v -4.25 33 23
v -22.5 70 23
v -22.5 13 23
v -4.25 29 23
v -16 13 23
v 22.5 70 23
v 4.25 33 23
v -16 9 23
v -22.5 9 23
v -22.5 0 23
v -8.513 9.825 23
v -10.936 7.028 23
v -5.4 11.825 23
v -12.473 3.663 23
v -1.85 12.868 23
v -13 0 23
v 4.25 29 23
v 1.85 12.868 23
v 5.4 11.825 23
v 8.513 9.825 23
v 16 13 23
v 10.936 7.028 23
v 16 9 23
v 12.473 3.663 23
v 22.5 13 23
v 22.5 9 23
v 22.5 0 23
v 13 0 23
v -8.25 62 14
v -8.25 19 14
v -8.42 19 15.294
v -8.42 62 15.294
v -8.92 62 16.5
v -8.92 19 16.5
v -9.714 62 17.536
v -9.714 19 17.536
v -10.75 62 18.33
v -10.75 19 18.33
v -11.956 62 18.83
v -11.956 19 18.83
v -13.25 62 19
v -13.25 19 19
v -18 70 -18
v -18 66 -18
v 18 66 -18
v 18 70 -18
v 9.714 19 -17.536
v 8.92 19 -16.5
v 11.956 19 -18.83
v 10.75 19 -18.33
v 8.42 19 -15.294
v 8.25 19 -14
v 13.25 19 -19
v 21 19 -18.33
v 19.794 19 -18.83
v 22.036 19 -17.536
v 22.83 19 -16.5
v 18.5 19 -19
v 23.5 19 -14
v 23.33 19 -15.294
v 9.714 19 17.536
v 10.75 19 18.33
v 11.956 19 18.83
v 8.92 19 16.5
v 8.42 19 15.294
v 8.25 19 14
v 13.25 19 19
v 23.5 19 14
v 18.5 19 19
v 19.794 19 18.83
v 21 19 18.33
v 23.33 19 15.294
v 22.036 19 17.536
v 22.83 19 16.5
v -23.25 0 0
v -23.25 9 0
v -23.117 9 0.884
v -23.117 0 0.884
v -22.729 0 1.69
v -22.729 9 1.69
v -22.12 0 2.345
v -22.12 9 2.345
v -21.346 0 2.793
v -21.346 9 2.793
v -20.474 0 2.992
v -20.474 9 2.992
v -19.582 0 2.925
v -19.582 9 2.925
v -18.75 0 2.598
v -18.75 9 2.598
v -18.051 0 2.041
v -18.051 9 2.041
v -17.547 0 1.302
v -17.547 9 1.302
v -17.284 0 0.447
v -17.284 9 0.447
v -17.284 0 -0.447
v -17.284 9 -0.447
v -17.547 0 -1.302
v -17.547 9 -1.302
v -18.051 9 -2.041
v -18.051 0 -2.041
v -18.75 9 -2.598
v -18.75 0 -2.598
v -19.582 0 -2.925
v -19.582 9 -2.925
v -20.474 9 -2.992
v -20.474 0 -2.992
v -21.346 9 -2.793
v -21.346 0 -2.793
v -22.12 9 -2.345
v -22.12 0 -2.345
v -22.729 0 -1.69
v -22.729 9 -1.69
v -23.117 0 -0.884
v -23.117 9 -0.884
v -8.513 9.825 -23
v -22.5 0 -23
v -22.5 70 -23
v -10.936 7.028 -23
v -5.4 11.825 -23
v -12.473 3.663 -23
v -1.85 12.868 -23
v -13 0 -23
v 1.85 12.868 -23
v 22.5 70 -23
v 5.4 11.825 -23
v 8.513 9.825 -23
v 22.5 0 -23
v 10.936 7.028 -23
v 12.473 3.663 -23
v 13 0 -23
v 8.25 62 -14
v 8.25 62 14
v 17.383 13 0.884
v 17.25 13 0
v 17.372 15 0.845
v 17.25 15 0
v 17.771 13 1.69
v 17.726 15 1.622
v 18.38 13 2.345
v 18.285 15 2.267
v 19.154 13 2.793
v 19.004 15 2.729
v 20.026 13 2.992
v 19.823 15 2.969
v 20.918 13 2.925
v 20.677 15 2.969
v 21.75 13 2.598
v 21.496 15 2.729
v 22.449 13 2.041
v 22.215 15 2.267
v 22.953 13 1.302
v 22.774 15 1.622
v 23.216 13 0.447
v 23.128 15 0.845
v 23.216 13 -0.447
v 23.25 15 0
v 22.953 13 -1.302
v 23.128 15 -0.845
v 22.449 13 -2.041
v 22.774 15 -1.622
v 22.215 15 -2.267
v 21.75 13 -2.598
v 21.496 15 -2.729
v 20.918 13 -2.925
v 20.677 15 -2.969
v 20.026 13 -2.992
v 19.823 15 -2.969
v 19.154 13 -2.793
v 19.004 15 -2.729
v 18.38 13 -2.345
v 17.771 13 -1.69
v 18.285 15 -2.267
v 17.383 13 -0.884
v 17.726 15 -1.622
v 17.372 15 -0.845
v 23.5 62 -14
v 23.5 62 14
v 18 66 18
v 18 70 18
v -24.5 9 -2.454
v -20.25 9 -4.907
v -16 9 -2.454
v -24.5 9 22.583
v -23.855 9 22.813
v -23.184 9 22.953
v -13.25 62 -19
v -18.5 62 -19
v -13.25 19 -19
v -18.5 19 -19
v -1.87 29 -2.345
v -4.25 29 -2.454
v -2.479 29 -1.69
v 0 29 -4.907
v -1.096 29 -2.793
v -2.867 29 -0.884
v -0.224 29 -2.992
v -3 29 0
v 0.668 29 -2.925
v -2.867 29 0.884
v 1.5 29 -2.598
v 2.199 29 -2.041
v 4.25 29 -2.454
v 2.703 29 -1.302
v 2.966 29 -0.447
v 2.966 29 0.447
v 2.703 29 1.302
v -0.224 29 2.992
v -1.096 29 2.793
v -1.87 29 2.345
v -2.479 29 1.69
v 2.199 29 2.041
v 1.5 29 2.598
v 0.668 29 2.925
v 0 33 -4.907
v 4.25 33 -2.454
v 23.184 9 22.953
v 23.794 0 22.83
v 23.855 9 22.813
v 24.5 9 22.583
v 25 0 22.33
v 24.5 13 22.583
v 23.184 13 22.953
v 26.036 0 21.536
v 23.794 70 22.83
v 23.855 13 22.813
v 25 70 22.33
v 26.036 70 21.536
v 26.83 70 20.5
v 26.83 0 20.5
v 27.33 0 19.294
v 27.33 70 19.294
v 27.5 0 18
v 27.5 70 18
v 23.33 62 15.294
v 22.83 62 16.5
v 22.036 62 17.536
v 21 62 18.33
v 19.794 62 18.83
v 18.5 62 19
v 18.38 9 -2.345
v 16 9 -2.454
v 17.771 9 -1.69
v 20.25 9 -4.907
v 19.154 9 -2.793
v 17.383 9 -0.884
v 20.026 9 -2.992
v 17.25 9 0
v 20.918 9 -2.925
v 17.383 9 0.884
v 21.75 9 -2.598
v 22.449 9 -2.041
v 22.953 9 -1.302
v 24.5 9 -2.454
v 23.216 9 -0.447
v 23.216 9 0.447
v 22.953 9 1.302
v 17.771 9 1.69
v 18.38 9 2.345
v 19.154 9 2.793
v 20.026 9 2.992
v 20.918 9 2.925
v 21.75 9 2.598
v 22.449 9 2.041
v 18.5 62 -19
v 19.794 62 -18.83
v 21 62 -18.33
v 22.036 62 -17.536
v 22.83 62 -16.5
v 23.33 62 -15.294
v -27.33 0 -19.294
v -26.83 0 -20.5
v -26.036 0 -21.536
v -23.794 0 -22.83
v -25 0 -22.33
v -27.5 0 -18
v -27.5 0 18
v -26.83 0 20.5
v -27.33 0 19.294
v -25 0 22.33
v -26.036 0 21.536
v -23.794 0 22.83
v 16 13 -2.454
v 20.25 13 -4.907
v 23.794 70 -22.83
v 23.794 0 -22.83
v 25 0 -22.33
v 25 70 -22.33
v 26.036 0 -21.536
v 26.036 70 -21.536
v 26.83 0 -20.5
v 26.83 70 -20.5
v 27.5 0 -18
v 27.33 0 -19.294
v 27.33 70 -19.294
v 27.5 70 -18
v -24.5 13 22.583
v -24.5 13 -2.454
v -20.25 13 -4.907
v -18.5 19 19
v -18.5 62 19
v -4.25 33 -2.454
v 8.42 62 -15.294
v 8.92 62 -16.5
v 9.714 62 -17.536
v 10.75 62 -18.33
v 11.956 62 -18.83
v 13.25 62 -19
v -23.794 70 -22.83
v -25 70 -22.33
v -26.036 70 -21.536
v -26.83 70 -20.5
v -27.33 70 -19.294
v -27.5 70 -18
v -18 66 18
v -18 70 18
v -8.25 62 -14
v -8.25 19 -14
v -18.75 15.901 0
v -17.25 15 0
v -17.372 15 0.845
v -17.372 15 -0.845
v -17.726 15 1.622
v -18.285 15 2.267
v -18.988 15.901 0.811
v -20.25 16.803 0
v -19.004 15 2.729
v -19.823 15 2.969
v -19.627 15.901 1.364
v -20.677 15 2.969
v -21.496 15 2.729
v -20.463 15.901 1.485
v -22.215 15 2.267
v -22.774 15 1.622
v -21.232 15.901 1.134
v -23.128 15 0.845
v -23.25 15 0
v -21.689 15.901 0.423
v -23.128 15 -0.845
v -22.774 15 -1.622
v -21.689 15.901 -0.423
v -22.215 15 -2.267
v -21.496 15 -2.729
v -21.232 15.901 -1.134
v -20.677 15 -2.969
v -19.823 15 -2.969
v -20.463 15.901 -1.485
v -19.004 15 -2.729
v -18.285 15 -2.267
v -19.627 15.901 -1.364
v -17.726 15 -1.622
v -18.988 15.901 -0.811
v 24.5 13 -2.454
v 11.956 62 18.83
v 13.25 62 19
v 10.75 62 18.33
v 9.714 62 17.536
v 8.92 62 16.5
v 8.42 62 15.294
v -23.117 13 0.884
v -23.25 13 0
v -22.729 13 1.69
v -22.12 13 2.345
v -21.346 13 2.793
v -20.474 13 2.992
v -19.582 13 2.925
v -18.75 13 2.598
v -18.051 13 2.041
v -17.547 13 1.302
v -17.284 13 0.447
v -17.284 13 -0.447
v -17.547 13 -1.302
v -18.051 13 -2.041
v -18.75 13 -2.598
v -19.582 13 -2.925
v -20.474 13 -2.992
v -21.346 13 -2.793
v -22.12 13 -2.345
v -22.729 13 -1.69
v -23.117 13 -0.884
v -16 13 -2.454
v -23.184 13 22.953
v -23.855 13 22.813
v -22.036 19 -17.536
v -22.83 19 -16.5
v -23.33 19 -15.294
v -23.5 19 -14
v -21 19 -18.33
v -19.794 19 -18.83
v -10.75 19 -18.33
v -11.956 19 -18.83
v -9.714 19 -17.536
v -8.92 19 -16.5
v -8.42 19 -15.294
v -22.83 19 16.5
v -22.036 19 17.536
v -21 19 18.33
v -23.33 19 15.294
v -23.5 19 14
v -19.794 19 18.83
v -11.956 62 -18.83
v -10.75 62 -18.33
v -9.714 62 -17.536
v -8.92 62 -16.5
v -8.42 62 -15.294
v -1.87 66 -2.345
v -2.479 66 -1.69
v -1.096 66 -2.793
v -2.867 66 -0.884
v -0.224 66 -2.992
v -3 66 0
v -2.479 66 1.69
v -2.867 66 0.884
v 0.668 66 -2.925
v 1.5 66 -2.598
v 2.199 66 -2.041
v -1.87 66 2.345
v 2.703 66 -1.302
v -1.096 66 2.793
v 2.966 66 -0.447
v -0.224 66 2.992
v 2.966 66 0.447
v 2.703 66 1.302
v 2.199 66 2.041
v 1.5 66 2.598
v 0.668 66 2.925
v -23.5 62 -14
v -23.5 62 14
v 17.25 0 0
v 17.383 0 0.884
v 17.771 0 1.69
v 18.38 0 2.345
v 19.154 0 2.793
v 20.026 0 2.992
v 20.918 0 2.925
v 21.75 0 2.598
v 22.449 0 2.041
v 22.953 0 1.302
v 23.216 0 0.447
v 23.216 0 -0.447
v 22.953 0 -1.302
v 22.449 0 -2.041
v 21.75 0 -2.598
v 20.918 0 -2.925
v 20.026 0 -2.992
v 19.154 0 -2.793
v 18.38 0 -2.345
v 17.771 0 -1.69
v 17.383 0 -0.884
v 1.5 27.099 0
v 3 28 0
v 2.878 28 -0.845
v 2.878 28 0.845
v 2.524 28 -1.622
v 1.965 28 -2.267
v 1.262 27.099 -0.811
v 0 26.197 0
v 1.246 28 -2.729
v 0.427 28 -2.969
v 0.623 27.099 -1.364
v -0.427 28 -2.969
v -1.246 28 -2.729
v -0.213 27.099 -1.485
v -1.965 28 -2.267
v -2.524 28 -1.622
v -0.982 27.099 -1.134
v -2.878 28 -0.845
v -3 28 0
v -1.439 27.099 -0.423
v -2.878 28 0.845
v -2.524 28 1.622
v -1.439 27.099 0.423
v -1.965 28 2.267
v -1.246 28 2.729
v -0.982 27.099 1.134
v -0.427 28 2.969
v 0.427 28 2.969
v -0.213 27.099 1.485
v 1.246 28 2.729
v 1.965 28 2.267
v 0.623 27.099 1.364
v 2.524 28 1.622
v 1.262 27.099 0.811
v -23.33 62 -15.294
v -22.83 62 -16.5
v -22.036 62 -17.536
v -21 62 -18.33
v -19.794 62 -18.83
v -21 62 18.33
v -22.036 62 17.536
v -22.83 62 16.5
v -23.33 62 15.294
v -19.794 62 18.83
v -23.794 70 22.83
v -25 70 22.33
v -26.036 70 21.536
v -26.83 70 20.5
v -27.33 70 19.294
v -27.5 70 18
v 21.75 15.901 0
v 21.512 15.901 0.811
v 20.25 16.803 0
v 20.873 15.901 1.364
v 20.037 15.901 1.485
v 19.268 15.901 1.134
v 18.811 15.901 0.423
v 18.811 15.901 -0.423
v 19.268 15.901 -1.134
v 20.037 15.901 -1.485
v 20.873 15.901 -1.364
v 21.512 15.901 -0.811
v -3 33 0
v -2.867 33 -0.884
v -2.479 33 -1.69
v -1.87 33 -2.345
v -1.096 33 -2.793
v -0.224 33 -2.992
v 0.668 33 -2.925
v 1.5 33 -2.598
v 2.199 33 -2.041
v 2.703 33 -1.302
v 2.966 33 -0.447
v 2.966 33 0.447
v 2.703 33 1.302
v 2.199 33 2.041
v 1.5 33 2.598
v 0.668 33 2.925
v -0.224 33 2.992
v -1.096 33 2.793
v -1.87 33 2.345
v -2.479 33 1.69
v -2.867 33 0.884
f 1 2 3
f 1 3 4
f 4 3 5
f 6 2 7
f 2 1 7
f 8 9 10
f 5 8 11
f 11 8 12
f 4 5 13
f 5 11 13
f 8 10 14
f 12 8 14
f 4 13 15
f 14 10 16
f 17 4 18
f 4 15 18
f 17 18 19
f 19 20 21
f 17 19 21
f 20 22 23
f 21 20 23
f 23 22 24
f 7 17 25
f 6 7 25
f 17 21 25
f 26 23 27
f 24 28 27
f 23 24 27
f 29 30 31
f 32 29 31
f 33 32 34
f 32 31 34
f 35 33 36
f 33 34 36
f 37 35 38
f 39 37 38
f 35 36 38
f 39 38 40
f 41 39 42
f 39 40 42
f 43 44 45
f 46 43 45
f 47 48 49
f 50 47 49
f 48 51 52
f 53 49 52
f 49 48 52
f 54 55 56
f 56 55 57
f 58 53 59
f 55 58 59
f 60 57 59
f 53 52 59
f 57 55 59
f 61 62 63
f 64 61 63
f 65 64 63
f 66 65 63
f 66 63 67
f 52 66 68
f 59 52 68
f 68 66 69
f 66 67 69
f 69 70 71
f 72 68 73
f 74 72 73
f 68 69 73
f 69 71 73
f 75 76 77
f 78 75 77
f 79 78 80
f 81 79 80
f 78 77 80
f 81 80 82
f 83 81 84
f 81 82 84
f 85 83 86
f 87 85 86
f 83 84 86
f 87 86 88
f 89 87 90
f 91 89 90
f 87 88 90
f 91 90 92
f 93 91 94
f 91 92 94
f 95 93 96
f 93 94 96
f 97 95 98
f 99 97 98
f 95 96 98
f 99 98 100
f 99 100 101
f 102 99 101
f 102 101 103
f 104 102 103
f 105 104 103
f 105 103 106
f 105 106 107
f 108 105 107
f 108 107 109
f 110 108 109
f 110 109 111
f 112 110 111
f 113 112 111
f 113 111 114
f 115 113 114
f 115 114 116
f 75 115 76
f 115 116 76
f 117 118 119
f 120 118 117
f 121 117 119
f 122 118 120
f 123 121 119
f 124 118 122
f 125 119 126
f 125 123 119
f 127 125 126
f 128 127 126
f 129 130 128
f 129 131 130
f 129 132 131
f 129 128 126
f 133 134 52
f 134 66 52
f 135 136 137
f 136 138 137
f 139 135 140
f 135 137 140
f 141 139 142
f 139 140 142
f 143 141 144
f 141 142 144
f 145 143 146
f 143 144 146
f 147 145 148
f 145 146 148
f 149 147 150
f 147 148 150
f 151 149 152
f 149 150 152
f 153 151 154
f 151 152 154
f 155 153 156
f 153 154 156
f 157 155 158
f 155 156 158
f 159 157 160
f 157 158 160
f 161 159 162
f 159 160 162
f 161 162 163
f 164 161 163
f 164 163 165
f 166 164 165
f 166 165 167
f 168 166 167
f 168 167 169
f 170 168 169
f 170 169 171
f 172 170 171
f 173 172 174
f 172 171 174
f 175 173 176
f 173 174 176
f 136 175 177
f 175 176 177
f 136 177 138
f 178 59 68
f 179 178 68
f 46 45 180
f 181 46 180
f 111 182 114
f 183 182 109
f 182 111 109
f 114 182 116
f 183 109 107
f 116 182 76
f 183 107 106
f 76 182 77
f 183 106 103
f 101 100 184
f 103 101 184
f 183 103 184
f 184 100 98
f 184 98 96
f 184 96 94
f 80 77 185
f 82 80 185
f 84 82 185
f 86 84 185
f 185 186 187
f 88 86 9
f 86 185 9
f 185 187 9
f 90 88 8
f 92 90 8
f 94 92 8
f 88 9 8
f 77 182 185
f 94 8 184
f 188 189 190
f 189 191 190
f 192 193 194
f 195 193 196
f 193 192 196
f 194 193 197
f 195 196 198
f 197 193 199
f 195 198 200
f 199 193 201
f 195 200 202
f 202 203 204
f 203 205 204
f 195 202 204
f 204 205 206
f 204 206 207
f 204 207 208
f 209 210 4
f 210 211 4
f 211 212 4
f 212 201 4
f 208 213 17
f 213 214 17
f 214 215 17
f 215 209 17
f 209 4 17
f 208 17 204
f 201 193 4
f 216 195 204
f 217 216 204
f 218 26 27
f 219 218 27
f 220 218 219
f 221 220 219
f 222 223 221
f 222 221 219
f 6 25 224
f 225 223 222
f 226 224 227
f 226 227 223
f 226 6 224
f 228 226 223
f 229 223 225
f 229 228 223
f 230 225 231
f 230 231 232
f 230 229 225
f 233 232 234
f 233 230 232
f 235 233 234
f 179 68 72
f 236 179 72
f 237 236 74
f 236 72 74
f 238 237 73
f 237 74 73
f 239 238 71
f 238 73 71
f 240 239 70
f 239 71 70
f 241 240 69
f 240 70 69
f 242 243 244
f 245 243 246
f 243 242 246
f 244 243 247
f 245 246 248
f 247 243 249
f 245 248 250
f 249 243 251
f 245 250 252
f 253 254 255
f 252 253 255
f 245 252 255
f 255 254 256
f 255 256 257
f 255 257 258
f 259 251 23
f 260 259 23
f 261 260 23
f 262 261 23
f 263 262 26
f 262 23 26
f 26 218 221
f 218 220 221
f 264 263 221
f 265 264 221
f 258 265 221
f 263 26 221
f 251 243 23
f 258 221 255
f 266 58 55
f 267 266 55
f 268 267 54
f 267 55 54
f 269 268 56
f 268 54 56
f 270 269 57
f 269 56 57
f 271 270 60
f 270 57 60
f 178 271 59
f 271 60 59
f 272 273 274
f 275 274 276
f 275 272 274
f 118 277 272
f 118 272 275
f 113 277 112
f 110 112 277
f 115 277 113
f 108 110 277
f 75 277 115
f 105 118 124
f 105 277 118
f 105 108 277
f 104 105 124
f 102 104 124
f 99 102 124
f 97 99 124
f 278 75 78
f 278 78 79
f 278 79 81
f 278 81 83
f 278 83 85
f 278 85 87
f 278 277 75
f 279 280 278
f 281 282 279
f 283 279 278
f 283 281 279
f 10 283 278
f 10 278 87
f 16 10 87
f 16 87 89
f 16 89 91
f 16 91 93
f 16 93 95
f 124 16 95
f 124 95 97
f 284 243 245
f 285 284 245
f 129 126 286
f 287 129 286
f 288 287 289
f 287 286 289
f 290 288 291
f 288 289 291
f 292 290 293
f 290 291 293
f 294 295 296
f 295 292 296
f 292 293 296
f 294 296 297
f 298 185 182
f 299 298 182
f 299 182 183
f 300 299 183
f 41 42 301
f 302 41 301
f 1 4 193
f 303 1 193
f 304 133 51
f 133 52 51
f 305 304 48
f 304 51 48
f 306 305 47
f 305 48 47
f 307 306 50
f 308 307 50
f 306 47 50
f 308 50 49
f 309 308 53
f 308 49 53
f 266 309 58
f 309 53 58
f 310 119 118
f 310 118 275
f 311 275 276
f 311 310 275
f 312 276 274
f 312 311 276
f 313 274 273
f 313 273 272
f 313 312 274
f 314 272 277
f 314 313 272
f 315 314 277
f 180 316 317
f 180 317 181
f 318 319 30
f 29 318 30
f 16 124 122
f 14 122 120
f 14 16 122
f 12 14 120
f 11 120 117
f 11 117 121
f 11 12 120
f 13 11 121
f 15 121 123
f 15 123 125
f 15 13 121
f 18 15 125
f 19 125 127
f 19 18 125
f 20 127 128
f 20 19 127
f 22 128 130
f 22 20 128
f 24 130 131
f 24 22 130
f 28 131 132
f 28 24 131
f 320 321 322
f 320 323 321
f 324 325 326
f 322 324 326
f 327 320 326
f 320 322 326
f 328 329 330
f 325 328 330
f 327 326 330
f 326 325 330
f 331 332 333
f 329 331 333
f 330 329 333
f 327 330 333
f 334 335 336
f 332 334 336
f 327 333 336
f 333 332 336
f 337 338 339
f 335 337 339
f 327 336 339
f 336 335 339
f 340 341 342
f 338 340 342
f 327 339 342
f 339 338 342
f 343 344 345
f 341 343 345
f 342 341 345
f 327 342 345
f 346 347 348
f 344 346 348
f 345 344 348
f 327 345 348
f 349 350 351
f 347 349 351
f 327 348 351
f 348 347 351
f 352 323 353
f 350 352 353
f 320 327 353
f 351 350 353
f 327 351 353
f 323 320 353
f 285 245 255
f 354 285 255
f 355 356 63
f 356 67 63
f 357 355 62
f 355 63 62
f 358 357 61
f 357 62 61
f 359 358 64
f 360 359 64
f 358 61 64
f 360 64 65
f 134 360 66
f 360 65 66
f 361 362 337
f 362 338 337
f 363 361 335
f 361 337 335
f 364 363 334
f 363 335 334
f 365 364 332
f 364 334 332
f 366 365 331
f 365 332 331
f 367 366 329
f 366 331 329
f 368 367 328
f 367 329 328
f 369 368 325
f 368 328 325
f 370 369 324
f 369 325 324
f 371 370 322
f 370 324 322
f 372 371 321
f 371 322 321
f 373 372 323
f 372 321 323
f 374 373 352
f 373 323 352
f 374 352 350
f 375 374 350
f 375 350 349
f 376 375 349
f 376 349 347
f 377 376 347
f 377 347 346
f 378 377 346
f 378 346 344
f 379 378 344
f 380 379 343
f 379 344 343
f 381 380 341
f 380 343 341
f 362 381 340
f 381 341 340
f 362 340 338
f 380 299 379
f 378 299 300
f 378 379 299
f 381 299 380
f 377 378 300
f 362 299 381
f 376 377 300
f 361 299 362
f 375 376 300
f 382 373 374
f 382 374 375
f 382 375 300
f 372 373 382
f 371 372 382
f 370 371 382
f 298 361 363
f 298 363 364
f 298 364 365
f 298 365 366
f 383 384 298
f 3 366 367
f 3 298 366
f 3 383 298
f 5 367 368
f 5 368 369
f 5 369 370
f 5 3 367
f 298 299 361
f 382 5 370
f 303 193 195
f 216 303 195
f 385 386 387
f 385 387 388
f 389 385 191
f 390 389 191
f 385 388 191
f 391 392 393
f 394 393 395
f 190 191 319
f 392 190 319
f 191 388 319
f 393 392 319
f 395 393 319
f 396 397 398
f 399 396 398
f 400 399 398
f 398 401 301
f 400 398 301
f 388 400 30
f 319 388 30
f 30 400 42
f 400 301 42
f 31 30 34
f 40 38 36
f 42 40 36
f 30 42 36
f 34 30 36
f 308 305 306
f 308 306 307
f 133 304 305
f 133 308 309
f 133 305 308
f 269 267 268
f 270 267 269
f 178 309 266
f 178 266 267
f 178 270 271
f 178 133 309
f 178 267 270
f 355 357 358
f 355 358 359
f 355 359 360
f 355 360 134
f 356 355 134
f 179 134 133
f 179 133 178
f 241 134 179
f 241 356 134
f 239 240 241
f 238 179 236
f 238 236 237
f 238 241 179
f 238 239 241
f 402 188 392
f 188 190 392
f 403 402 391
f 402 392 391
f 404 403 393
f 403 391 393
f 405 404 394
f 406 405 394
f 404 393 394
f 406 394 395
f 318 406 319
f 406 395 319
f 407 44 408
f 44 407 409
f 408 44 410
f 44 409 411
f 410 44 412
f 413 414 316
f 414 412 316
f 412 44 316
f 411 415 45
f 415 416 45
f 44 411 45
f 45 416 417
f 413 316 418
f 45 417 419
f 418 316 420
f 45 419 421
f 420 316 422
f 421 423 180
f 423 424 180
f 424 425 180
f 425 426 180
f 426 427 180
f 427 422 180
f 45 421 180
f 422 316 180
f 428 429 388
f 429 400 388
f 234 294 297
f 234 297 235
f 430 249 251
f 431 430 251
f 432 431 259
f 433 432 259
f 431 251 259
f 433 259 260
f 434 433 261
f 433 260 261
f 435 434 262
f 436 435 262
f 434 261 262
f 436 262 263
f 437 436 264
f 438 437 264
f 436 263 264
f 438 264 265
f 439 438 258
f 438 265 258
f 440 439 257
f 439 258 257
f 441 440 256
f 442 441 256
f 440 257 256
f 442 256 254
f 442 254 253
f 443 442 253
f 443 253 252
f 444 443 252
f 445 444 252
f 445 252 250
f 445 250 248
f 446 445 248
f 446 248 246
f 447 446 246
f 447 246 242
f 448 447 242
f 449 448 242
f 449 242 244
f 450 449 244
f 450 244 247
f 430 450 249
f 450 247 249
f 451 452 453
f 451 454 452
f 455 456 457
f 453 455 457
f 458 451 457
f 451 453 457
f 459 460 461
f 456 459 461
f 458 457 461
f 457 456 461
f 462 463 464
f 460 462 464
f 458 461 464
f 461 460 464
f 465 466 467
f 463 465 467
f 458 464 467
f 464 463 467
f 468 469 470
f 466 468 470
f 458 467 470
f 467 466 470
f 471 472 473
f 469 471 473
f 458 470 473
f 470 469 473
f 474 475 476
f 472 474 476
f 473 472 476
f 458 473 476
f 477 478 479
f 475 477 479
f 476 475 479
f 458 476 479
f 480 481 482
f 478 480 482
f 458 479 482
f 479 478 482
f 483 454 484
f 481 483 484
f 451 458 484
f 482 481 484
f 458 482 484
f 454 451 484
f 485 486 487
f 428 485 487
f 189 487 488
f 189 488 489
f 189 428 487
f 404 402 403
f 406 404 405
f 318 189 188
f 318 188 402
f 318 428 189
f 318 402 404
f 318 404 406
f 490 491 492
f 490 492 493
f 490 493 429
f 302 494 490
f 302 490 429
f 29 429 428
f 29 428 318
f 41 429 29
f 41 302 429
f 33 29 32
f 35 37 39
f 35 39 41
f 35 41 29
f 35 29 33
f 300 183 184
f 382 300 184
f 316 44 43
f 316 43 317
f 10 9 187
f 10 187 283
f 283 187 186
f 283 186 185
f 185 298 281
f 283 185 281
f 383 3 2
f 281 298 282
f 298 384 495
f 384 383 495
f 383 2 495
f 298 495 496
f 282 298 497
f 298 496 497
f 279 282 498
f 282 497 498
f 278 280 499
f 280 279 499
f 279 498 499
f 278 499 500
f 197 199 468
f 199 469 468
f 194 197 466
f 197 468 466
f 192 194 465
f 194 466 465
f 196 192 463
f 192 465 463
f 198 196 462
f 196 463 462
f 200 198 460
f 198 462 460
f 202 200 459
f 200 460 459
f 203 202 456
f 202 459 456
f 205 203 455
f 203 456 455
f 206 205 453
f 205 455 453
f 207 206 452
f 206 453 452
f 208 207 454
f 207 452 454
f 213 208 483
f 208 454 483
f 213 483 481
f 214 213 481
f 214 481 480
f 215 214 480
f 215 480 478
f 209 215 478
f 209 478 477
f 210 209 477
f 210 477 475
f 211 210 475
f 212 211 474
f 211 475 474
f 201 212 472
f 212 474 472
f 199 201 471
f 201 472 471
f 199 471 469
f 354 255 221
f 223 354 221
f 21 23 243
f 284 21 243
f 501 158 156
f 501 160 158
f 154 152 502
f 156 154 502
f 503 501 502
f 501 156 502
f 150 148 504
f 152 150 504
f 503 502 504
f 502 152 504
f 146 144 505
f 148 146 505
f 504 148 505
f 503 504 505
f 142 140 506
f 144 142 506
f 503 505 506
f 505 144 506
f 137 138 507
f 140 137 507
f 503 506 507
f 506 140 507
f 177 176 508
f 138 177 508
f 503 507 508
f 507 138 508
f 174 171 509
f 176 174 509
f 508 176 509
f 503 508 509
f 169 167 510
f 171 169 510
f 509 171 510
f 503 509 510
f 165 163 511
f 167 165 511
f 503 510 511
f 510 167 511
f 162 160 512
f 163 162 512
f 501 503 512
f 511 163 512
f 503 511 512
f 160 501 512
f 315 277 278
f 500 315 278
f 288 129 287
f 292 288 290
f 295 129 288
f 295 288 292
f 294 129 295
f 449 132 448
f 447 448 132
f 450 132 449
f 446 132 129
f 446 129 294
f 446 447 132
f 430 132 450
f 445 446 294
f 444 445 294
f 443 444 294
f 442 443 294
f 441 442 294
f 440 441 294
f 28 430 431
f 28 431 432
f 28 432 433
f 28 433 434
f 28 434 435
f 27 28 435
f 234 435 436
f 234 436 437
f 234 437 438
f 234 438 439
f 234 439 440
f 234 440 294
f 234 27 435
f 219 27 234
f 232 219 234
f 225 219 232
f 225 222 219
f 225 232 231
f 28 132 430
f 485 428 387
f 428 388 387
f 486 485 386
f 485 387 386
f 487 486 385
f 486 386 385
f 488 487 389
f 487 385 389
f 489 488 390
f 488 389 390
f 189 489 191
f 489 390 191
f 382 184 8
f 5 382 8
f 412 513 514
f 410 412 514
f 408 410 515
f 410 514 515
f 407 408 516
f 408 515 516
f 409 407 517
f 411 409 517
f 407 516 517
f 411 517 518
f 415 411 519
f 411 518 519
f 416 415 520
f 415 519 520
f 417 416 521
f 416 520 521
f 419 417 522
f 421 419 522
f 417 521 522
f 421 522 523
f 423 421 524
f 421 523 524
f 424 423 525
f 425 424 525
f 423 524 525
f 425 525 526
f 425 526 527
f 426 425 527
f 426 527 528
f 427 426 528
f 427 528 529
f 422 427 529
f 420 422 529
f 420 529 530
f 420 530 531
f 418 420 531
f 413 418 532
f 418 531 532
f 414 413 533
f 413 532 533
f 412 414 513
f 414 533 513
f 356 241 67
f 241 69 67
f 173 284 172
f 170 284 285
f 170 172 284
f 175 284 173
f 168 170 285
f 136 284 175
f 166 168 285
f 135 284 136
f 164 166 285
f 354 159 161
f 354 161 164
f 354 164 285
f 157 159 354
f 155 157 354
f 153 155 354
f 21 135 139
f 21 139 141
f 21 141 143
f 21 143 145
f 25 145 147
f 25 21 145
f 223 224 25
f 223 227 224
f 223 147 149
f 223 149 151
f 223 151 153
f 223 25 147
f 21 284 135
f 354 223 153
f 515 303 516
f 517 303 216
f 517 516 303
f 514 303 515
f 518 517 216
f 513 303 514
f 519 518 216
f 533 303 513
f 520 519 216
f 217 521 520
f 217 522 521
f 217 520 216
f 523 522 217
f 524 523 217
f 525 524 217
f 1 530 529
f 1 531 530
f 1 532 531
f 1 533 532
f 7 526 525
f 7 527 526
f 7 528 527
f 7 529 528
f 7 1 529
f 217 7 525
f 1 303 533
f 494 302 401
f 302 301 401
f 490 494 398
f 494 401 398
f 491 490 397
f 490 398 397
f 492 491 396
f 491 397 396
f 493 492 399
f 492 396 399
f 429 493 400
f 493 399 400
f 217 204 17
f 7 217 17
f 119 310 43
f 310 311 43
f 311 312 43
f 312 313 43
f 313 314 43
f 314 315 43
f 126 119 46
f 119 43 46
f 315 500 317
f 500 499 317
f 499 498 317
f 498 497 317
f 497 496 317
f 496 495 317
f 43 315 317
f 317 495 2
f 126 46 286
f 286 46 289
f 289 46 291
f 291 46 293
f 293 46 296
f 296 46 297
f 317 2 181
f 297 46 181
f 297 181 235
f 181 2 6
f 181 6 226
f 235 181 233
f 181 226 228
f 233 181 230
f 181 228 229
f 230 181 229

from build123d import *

# Parameters (mm, degrees)
F0_W         = 55
F0_H         = 46
F5_DEPTH     = 70
F1_W         = 7.25
F1_H         = 70
F6_DEPTH     = 23
F7_D         = 6
F7_DEPTH     = 15
F7_TIP       = 1.8025818571
F9_DEPTH     = 4
F10_W        = 36
F10_H        = 36
F11_DEPTH    = 4
F12_D        = 6
F12_DEPTH    = 38
F12_TIP      = 1.8025818571
F14_DEPTH    = 4
F15_T1_DEPTH = 95
F16_DEPTH    = 33
F17_DEPTH    = 10


# Not quite as in the source:
# - a fillet or chamfer that OpenCascade refuses, or shapes differently, is made with other operations: its cross-section is extruded or revolved along the edge and cut away or added


with BuildPart() as f5:
    # F0 (on Front) → F5 (new body)
    with BuildSketch(Plane.XZ):
        Rectangle(F0_W, F0_H)
    extrude(amount=-F5_DEPTH)

    # F1 (on Top) → F6 (intersect, symmetric)
    with BuildSketch(Plane.XY):
        with BuildLine():
            Line((-20.25, 0), (-13, 0))
            ThreePointArc((-13, 0), (0, 13), (13, 0))
            Line((13, 0), (20.25, 0))
            Line((20.25, 0), (20.25, 70))
            Line((20.25, 70), (-20.25, 70))
            Line((-20.25, 70), (-20.25, 0))
        make_face()
        with Locations((-23.875, 35)):
            Rectangle(F1_W, F1_H)
        with Locations((23.875, 35)):
            Rectangle(F1_W, F1_H)
    extrude(amount=F6_DEPTH, both=True, mode=Mode.INTERSECT)

    # F7
    with Locations(Plane.XZ):
        with Locations((-20.25, 0), (20.25, 0)):
            Hole(F7_D / 2, depth=F7_DEPTH)
            with Locations((0, 0, -(F7_DEPTH + F7_TIP / 2))):  # 118° drill point
                Cone(0, F7_D / 2, F7_TIP, mode=Mode.SUBTRACT)

    # F8 (on offset) → F9 (cut)
    with BuildSketch(Plane.XZ.offset(-9)):
        Polygon((-24.5, 2.4537386441), (-24.5, 2.25), (-24.5, -2.4537386441), (-20.25, -4.9074772881), (-16, -2.4537386441), (-16, 2), (-16, 2.4537386441), (-20.25, 4.9074772881), align=None)
        Polygon((-24.5, 23), (-24.5, 2.4537386441), (-20.25, 4.9074772881), (-16, 2.4537386441), (-16, 23), align=None)
        Polygon((24.5, 2.4537386441), (24.5, 23), (16, 23), (16, 2.4537386441), (16, 2), (16, -2.4537386441), (20.25, -4.9074772881), (24.5, -2.4537386441), (24.5, 2.25), align=None)
    extrude(amount=-F9_DEPTH, mode=Mode.SUBTRACT)

    # F10 (on offset) → F11 (cut)
    with BuildSketch(Plane.XZ.offset(-66)):
        Rectangle(F10_W, F10_H)
    extrude(amount=-F11_DEPTH, mode=Mode.SUBTRACT)

    # F12
    with Locations(Plane(origin=(0, 66, 0), x_dir=(1, 0, 0), z_dir=(0, 1, 0))):
        with Locations((0, 0)):
            Hole(F12_D / 2, depth=F12_DEPTH)
            with Locations((0, 0, -(F12_DEPTH + F12_TIP / 2))):  # 118° drill point
                Cone(0, F12_D / 2, F12_TIP, mode=Mode.SUBTRACT)

    # F13 (on offset) → F14 (cut)
    with BuildSketch(Plane.XZ.offset(-29)):
        Polygon((-4.25, 2.4537386441), (-4.25, 2.25), (-4.25, -2.4537386441), (0, -4.9074772881), (4.25, -2.4537386441), (4.25, 2.0686155439), (4.25, 2.4537386441), (0, 4.9074772881), align=None)
        Polygon((-4.25, 23), (-4.25, 2.4537386441), (0, 4.9074772881), (4.25, 2.4537386441), (4.25, 23), align=None)
        with BuildLine():
            ThreePointArc((23.5, 14), (22.0355339059, 17.5355339059), (18.5, 19))
            Line((18.5, 19), (13.25, 19))
            ThreePointArc((13.25, 19), (9.7144660941, 17.5355339059), (8.25, 14))
            Line((8.25, 14), (8.25, -14))
            ThreePointArc((8.25, -14), (9.7144660941, -17.5355339059), (13.25, -19))
            Line((13.25, -19), (18.5, -19))
            ThreePointArc((18.5, -19), (22.0355339059, -17.5355339059), (23.5, -14))
            Line((23.5, -14), (23.5, 14))
        make_face()
        with BuildLine():
            Line((-13.25, 19), (-18.5, 19))
            ThreePointArc((-18.5, 19), (-22.0355339059, 17.5355339059), (-23.5, 14))
            Line((-23.5, 14), (-23.5, -14))
            ThreePointArc((-23.5, -14), (-22.0355339059, -17.5355339059), (-18.5, -19))
            Line((-18.5, -19), (-13.25, -19))
            ThreePointArc((-13.25, -19), (-9.7144660941, -17.5355339059), (-8.25, -14))
            Line((-8.25, -14), (-8.25, 14))
            ThreePointArc((-8.25, 14), (-9.7144660941, 17.5355339059), (-13.25, 19))
        make_face()
    extrude(amount=-F14_DEPTH, mode=Mode.SUBTRACT)

    # F15: fillet of radius 5 on 4 edges, made by hand

    # F15_s2 → F15_t1 (cut)
    with BuildSketch(Plane.XZ.offset(-82.5)):
        with BuildLine():
            ThreePointArc((-22.5, 23), (-26.0355339059, 21.5355339059), (-27.5, 18))
            Line((-27.5, 18), (-27.5, 23))
            Line((-27.5, 23), (-22.5, 23))
        make_face()
        with BuildLine():
            ThreePointArc((22.5, 23), (26.0355339059, 21.5355339059), (27.5, 18))
            Line((27.5, 18), (27.5, 23))
            Line((27.5, 23), (22.5, 23))
        make_face()
        with BuildLine():
            ThreePointArc((-22.5, -23), (-26.0355339059, -21.5355339059), (-27.5, -18))
            Line((-27.5, -18), (-27.5, -23))
            Line((-27.5, -23), (-22.5, -23))
        make_face()
        with BuildLine():
            ThreePointArc((22.5, -23), (26.0355339059, -21.5355339059), (27.5, -18))
            Line((27.5, -18), (27.5, -23))
            Line((27.5, -23), (22.5, -23))
        make_face()
    extrude(amount=F15_T1_DEPTH, mode=Mode.SUBTRACT)

    # F13 (on offset) → F16 (cut)
    with BuildSketch(Plane.XZ.offset(-29)):
        with BuildLine():
            ThreePointArc((23.5, 14), (22.0355339059, 17.5355339059), (18.5, 19))
            Line((18.5, 19), (13.25, 19))
            ThreePointArc((13.25, 19), (9.7144660941, 17.5355339059), (8.25, 14))
            Line((8.25, 14), (8.25, -14))
            ThreePointArc((8.25, -14), (9.7144660941, -17.5355339059), (13.25, -19))
            Line((13.25, -19), (18.5, -19))
            ThreePointArc((18.5, -19), (22.0355339059, -17.5355339059), (23.5, -14))
            Line((23.5, -14), (23.5, 14))
        make_face()
        with BuildLine():
            Line((-13.25, 19), (-18.5, 19))
            ThreePointArc((-18.5, 19), (-22.0355339059, 17.5355339059), (-23.5, 14))
            Line((-23.5, 14), (-23.5, -14))
            ThreePointArc((-23.5, -14), (-22.0355339059, -17.5355339059), (-18.5, -19))
            Line((-18.5, -19), (-13.25, -19))
            ThreePointArc((-13.25, -19), (-9.7144660941, -17.5355339059), (-8.25, -14))
            Line((-8.25, -14), (-8.25, 14))
            ThreePointArc((-8.25, 14), (-9.7144660941, 17.5355339059), (-13.25, 19))
        make_face()
    extrude(amount=-F16_DEPTH, mode=Mode.SUBTRACT)

    # F13 (on offset) → F17 (cut)
    with BuildSketch(Plane.XZ.offset(-29)):
        with BuildLine():
            ThreePointArc((23.5, 14), (22.0355339059, 17.5355339059), (18.5, 19))
            Line((18.5, 19), (13.25, 19))
            ThreePointArc((13.25, 19), (9.7144660941, 17.5355339059), (8.25, 14))
            Line((8.25, 14), (8.25, -14))
            ThreePointArc((8.25, -14), (9.7144660941, -17.5355339059), (13.25, -19))
            Line((13.25, -19), (18.5, -19))
            ThreePointArc((18.5, -19), (22.0355339059, -17.5355339059), (23.5, -14))
            Line((23.5, -14), (23.5, 14))
        make_face()
        with BuildLine():
            Line((-13.25, 19), (-18.5, 19))
            ThreePointArc((-18.5, 19), (-22.0355339059, 17.5355339059), (-23.5, 14))
            Line((-23.5, 14), (-23.5, -14))
            ThreePointArc((-23.5, -14), (-22.0355339059, -17.5355339059), (-18.5, -19))
            Line((-18.5, -19), (-13.25, -19))
            ThreePointArc((-13.25, -19), (-9.7144660941, -17.5355339059), (-8.25, -14))
            Line((-8.25, -14), (-8.25, 14))
            ThreePointArc((-8.25, 14), (-9.7144660941, 17.5355339059), (-13.25, 19))
        make_face()
    extrude(amount=F17_DEPTH, mode=Mode.SUBTRACT)


solid = f5.part
